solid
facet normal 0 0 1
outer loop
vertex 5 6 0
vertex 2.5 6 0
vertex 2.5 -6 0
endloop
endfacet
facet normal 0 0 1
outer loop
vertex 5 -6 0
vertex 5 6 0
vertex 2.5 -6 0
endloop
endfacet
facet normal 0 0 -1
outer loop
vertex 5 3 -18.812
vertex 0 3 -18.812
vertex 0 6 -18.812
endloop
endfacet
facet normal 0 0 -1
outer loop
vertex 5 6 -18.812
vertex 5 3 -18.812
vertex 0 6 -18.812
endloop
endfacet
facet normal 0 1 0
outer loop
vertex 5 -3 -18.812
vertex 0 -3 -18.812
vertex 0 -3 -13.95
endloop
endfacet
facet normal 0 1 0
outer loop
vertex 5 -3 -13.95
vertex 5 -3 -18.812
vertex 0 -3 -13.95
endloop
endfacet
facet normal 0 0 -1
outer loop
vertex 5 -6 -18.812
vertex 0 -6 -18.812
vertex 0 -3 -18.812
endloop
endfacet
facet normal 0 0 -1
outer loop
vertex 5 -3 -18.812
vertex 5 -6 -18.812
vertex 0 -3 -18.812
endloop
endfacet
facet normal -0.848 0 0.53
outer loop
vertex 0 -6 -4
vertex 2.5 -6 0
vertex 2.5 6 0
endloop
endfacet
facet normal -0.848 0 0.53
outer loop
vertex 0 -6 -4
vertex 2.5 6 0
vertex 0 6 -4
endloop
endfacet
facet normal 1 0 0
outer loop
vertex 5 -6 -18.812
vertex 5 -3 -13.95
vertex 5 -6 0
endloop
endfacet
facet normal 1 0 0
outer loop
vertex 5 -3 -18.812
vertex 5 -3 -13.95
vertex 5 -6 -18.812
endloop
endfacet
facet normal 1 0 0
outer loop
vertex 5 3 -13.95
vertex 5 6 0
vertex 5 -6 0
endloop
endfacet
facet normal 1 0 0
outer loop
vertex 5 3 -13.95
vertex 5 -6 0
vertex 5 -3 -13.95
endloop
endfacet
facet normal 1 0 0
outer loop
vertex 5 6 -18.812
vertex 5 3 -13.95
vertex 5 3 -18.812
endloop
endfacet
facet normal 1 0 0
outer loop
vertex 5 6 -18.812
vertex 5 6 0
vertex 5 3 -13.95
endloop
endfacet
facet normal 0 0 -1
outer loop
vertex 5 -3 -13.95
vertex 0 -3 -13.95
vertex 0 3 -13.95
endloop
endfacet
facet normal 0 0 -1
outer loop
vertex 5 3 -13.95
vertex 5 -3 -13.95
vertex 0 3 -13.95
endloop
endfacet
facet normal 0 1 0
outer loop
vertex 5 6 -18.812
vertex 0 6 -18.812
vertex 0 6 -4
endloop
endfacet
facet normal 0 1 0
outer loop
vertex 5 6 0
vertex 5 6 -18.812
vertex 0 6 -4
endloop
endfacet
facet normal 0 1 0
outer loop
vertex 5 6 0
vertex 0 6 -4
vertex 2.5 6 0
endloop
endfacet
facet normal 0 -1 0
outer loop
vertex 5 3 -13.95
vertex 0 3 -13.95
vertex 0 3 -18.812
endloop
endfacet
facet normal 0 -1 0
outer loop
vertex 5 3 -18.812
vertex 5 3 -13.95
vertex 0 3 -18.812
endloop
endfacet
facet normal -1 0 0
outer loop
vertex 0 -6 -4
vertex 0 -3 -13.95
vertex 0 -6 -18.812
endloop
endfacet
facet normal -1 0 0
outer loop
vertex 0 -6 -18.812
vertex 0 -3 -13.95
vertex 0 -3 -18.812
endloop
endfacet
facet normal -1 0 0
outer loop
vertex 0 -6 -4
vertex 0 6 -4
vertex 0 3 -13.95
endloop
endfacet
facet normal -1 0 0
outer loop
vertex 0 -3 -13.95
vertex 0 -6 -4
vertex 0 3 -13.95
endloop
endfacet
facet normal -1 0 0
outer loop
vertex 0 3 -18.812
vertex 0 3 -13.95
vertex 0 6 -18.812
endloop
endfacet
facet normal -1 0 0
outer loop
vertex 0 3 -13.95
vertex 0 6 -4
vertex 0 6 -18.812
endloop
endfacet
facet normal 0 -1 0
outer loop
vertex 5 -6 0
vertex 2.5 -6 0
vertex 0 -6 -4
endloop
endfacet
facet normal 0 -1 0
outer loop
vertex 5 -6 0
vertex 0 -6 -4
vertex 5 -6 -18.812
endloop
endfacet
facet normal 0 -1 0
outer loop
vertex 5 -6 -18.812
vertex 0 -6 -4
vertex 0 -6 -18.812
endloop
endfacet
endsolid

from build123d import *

# Parameters (mm, degrees)
BOSS_EXTRUDE1_DEPTH = 5
CUT_EXTRUDE1_DEPTH  = 23.867116988


with BuildPart() as part:
    # Sketch1 → Boss-Extrude1 (new body)
    with BuildSketch(Plane(origin=(0, 0, 0), x_dir=(0, 0, -1), z_dir=(1, 0, 0))):
        Polygon((0, 6), (0, -6), (18.812364002, -6), (18.812364002, -3), (13.95008688, -3), (13.95008688, 3), (18.812364002, 3), (18.812364002, 6), align=None)
    extrude(amount=BOSS_EXTRUDE1_DEPTH)

    # Sketch2 → Cut-Extrude1 (cut, through all)
    with BuildSketch(Plane(origin=(0, 6, 0), x_dir=(1, 0, 0), z_dir=(0, 1, 0))):
        Polygon((0, 4), (0, 0), (2.5, 0), align=None)
    extrude(amount=-CUT_EXTRUDE1_DEPTH, mode=Mode.SUBTRACT)


solid = part.part
